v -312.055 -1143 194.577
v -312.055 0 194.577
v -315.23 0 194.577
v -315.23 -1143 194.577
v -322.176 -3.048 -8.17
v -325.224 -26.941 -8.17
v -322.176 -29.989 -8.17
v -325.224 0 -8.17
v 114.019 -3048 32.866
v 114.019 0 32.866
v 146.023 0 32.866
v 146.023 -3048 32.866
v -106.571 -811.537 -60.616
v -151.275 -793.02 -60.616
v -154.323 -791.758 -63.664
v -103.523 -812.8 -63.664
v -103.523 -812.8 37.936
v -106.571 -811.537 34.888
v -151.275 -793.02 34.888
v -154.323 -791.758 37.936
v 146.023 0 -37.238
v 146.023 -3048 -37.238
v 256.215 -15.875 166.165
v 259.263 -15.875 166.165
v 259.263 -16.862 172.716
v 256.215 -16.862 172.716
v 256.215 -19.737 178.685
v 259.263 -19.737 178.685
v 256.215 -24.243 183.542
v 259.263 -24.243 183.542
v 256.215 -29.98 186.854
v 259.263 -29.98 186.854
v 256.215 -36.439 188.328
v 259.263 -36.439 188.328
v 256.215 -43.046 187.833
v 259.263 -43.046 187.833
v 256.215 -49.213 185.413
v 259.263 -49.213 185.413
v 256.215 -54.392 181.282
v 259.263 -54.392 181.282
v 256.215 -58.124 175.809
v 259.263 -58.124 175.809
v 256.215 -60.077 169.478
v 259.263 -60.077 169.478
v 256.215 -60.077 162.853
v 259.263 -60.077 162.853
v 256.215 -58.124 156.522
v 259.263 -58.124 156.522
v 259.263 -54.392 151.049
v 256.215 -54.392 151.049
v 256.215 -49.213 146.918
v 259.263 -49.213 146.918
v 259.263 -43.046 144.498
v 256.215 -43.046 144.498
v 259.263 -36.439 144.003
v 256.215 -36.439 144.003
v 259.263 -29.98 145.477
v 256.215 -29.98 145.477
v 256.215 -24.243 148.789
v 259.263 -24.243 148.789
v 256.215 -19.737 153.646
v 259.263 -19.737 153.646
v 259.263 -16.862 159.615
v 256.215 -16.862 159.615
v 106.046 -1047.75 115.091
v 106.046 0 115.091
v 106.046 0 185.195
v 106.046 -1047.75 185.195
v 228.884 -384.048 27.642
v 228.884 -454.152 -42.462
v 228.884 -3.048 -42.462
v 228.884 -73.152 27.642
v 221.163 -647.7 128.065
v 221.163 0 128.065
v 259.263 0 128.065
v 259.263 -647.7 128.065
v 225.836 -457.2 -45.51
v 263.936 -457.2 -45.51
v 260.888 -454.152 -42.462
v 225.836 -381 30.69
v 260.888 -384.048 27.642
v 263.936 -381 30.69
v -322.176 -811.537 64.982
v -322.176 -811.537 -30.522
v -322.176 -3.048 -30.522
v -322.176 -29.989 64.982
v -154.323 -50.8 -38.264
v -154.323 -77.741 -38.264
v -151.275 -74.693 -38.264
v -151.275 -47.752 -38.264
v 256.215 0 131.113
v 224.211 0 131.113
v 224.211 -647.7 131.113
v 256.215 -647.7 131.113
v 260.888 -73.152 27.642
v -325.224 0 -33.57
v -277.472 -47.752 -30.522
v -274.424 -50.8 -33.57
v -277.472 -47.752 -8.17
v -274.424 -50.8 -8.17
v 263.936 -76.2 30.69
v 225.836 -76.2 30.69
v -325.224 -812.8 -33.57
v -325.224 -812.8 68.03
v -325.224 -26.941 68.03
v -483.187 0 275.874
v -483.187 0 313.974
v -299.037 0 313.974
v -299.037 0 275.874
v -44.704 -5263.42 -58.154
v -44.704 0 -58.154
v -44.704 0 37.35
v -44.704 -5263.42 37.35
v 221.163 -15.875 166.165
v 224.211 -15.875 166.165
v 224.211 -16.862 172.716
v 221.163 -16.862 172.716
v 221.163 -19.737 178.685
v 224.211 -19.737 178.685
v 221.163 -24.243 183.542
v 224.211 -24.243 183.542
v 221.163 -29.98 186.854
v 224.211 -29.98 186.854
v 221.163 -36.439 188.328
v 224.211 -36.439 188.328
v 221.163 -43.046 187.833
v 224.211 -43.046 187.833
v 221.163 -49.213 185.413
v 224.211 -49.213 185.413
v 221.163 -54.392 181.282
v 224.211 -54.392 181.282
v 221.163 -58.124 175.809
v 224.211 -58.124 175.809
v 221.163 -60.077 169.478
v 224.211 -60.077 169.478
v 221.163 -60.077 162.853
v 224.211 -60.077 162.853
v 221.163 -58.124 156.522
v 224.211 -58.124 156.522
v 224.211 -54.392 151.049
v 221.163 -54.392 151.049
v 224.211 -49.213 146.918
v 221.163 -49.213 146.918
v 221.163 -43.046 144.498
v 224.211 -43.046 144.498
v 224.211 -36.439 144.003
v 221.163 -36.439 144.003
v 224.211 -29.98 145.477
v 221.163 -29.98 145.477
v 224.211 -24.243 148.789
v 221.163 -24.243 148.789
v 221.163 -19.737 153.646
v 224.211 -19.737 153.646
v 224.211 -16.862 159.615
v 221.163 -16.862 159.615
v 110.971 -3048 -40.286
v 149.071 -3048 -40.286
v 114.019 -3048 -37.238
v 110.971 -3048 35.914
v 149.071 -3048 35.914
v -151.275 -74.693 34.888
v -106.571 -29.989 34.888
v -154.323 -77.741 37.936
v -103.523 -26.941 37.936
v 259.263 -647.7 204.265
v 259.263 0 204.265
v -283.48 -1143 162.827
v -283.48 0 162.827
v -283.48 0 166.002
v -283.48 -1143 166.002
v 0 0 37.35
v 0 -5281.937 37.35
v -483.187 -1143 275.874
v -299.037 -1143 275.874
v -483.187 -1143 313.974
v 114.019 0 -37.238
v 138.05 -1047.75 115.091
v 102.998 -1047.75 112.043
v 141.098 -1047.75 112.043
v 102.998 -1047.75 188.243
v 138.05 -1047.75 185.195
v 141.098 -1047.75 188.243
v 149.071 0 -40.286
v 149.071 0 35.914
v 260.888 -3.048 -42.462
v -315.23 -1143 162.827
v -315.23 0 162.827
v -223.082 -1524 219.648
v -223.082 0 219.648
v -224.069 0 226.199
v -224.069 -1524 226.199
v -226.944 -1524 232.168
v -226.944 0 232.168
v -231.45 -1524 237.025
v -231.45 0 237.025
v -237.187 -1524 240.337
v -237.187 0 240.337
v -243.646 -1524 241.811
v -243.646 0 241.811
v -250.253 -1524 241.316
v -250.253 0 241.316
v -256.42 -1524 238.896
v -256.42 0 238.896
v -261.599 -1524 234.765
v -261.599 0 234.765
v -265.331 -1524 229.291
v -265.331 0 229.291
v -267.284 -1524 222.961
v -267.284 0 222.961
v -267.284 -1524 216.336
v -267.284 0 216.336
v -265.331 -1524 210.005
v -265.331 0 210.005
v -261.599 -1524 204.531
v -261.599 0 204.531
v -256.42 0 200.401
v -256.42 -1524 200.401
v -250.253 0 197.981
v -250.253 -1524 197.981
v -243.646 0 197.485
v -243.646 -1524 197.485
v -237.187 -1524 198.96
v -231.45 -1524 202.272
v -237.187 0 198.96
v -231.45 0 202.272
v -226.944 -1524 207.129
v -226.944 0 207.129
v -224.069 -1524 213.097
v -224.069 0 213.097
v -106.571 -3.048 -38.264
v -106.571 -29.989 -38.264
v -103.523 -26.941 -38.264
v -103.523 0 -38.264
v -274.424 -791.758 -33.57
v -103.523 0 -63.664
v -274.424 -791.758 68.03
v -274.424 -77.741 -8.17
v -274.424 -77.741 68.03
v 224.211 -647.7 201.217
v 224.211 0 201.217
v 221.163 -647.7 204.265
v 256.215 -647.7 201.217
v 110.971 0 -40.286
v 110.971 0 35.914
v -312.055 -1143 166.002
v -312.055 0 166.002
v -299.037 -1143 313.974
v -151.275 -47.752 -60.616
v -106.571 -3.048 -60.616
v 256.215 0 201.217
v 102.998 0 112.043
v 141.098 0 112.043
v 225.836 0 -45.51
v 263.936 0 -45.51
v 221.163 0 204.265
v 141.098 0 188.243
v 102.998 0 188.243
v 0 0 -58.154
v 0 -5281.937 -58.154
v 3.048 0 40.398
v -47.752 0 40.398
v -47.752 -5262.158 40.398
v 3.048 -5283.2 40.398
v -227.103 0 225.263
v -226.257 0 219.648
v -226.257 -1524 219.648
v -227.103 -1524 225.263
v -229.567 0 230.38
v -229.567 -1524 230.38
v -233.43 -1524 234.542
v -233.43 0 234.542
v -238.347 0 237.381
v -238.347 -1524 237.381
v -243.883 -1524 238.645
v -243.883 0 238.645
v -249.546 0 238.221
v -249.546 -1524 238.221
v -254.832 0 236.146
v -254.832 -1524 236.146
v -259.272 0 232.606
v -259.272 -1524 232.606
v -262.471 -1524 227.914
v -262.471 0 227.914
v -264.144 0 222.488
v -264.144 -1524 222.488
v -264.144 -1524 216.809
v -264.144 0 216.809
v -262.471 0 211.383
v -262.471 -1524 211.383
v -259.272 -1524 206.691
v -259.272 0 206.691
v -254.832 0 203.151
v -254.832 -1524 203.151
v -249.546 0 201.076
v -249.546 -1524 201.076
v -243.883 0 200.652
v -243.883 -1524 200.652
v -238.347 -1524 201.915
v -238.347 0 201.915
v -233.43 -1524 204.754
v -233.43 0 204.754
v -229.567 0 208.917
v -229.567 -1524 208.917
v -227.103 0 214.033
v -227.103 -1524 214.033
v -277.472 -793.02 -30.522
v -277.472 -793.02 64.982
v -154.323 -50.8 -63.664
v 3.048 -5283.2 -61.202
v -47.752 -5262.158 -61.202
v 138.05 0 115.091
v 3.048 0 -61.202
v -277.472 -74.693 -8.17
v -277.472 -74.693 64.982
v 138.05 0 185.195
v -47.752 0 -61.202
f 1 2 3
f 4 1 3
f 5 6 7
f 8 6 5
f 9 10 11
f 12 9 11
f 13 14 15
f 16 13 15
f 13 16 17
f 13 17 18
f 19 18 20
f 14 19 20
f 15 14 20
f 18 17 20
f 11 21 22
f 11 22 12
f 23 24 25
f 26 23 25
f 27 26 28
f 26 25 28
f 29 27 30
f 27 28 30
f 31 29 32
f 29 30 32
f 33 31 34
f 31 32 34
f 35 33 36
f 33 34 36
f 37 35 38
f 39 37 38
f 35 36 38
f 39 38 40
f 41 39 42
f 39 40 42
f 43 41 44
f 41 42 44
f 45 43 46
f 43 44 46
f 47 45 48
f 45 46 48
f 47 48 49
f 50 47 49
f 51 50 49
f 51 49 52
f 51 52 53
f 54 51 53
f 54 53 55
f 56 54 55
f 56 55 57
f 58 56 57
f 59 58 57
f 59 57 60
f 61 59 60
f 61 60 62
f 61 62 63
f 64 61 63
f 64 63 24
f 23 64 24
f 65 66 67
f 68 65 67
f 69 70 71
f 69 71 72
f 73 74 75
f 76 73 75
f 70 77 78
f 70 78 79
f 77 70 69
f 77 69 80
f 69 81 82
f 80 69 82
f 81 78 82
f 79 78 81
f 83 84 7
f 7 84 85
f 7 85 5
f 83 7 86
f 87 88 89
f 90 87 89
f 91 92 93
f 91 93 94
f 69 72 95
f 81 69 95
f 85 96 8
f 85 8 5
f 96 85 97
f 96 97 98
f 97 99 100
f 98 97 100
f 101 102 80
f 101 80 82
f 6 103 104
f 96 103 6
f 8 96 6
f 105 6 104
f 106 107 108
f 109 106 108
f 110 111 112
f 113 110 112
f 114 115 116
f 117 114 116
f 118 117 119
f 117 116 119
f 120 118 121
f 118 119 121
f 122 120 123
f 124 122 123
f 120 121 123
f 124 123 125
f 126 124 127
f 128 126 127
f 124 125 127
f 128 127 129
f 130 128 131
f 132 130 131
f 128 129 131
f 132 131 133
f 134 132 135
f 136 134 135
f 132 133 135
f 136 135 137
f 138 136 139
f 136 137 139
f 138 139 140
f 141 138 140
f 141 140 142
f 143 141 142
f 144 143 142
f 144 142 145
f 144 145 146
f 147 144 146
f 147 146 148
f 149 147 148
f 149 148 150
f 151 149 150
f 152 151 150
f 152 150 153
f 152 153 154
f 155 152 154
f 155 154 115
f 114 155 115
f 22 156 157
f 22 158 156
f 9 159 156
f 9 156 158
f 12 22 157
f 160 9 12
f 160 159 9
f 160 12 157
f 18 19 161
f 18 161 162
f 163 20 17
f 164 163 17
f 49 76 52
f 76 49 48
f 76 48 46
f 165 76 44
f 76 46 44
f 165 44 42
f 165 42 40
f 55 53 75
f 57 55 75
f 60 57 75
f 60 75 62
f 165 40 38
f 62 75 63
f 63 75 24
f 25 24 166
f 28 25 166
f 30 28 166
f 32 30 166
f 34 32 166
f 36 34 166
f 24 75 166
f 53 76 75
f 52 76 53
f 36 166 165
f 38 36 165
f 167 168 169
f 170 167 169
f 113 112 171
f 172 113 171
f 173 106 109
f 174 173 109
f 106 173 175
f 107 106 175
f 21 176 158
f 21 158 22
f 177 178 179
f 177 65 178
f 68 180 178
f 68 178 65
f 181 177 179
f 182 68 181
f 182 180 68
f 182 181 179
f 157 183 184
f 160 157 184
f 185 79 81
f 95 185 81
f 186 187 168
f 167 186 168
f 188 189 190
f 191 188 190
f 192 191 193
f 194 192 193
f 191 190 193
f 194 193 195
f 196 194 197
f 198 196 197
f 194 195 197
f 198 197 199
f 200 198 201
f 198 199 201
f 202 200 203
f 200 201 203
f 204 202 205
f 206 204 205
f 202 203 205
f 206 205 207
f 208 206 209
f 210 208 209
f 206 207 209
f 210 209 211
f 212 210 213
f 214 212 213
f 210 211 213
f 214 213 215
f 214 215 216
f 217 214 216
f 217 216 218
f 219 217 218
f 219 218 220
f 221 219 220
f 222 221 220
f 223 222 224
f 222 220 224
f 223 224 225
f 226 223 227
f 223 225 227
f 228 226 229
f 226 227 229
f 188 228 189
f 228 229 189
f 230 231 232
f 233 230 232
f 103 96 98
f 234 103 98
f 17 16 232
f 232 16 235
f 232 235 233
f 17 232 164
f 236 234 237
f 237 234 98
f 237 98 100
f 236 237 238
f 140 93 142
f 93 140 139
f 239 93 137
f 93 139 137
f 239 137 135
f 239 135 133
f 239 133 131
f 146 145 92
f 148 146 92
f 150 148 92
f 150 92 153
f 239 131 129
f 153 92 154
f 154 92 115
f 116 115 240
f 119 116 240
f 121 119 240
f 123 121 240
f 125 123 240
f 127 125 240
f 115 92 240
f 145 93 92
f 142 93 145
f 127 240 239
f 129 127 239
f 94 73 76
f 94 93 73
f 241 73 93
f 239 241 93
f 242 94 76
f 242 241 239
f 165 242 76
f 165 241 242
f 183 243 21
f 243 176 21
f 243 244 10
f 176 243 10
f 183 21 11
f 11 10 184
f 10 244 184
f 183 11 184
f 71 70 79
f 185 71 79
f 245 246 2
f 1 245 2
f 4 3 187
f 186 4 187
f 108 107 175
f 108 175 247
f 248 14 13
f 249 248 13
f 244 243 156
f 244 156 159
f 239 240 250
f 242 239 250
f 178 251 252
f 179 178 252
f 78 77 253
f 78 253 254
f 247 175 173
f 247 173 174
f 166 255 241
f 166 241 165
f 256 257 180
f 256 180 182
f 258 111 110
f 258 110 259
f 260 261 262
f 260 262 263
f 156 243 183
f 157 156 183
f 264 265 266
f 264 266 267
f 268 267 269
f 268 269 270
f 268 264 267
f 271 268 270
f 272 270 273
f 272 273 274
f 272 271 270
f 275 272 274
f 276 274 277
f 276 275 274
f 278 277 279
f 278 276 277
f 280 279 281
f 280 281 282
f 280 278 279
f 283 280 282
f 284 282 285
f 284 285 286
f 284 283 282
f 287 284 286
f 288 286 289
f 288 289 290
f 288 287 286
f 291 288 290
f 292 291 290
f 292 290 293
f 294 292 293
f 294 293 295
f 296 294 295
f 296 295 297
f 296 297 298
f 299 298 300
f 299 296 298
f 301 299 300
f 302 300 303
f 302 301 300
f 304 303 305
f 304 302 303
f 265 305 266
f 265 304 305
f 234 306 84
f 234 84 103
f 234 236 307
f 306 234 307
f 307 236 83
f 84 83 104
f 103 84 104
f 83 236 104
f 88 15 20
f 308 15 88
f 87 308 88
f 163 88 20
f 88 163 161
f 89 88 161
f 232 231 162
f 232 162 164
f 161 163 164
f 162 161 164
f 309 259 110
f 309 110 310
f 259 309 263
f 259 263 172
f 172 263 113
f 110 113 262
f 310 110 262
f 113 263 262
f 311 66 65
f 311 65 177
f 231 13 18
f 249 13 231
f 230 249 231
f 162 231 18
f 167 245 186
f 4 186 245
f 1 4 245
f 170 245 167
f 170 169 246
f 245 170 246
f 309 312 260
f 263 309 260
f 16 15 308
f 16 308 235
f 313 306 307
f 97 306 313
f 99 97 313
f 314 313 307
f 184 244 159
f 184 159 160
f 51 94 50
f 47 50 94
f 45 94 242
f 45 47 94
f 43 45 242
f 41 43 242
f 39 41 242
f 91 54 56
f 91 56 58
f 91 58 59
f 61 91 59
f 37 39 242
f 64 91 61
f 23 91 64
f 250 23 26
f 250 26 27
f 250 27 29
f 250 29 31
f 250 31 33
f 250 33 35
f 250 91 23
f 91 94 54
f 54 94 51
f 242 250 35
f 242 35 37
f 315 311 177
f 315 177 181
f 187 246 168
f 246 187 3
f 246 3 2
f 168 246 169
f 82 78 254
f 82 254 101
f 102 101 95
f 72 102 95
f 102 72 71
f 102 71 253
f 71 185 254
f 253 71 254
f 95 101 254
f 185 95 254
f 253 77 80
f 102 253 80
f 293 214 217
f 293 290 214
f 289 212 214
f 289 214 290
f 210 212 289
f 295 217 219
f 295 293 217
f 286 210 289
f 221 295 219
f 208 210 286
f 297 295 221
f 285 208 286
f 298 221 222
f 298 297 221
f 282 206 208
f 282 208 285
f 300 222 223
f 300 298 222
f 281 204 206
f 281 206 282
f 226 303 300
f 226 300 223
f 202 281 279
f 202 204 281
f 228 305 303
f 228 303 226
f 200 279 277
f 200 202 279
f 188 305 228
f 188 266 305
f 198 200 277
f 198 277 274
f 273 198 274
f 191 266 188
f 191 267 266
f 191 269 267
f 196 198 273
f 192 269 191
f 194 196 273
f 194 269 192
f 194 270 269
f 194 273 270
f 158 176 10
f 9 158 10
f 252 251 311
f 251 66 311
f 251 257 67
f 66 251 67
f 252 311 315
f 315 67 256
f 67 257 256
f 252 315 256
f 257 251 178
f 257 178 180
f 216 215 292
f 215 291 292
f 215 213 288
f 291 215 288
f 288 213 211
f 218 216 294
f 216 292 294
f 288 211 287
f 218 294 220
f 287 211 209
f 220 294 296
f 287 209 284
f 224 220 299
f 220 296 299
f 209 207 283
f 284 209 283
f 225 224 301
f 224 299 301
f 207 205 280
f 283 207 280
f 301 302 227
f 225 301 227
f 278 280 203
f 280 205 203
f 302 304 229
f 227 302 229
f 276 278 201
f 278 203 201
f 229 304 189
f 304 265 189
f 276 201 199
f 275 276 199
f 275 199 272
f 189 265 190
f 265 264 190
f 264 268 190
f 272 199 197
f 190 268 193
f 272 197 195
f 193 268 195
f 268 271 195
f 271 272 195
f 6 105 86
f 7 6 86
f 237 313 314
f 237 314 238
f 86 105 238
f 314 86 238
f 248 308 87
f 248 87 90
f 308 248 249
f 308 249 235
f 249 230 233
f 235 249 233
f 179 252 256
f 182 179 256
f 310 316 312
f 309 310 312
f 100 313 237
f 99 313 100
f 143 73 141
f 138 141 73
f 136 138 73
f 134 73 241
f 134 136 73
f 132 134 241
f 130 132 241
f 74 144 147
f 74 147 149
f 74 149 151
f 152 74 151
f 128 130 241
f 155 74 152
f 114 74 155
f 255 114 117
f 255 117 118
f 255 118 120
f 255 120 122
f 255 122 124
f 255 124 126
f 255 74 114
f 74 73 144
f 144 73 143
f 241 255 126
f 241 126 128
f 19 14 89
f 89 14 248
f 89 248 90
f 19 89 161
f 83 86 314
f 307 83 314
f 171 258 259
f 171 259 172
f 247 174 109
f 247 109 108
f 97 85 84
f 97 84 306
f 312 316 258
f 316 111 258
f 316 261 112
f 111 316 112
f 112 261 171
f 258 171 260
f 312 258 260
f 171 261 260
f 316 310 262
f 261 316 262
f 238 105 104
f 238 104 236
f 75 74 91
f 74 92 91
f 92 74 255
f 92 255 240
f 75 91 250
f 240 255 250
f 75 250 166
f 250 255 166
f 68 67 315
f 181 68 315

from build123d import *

# Parameters (mm, degrees)
F0_W      = 184.15
F0_H      = 38.1
F1_DEPTH  = 1143
F0_R      = 22.225
F0_R_2    = 19.05
F2_DEPTH  = 1524
F3_DEPTH  = 1143
F0_W_2    = 50.8
F0_H_2    = 101.5999930616
F0_W_3    = 44.704
F0_H_3    = 95.5039930616
F4_DEPTH  = 812.8
F5_DEPTH  = 5283.2
F0_W_4    = 38.1
F0_H_4    = 76.2
F0_W_5    = 32.004
F0_H_5    = 70.104
F6_DEPTH  = 1047.75
F7_DEPTH  = 3048
F8_DEPTH  = 647.7
F9_DEPTH  = 457.2
F12_R     = 22.225
F13_DEPTH = 38.1
F15_DEPTH = 38.1
F16_DEPTH = 101.6
F17_DEPTH = 76.2
F18_DEPTH = 101.6
F19_DEPTH = 101.6
F20_DEPTH = 812.8
F22_DEPTH = 101.6
F23_DEPTH = 76.2


with BuildPart() as f1:
    # F0 (on Front) → F1 (new body)
    with BuildSketch(Plane.XZ):
        with Locations((-391.1115131855, 294.9241080761)):
            Rectangle(F0_W, F0_H)
    extrude(amount=F1_DEPTH)


with BuildPart() as f2:
    # F0 (on Front) → F2 (new body)
    with BuildSketch(Plane.XZ):
        with Locations((-245.3070729971, 219.6483165026)):
            Circle(F0_R)
        with Locations((-245.3070729971, 219.6483165026)):
            Circle(F0_R_2, mode=Mode.SUBTRACT)
    extrude(amount=F2_DEPTH)


with BuildPart() as f3:
    # F0 (on Front) → F3 (new body)
    with BuildSketch(Plane.XZ):
        Polygon((-312.0547735214, 194.5774768591), (-315.2297735214, 194.5774768591), (-315.2297735214, 162.8274768591), (-283.4797735214, 162.8274768591), (-283.4797735214, 166.0024768591), (-312.0547735214, 166.0024768591), align=None)
    extrude(amount=F3_DEPTH)


with BuildPart() as f4:
    # F0 (on Front) → F4 (new body)
    with BuildSketch(Plane.XZ):
        with Locations((-128.9231777191, -12.8643456846)):
            Rectangle(F0_W_2, F0_H_2)
        with Locations((-128.9231777191, -12.8643456846)):
            Rectangle(F0_W_3, F0_H_3, mode=Mode.SUBTRACT)
    extrude(amount=F4_DEPTH)

    # F10 (on face) → F16 (cut)
    with BuildSketch(Plane.XY.offset(37.9356508461)):
        Polygon((-154.3231777191, -50.8), (-103.5231777191, 0), (-154.3231777191, 0), align=None)
    extrude(amount=-F16_DEPTH, mode=Mode.SUBTRACT)

    # F10 (on face) → F17 (cut)
    with BuildSketch(Plane.XY.offset(37.9356508461)):
        Polygon((-154.3231777191, -77.7407683632), (-103.5231777191, -26.9407683632), (-103.5231777191, 0), (-154.3231777191, -50.8), align=None)
    extrude(amount=-F17_DEPTH, mode=Mode.SUBTRACT)

    # F10 (on face) → F18 (cut)
    with BuildSketch(Plane.XY.offset(37.9356508461)):
        Polygon((-154.3231777191, -812.8), (-103.5231777191, -812.8), (-154.3231777191, -791.7579510314), align=None)
    extrude(amount=-F18_DEPTH, mode=Mode.SUBTRACT)


with BuildPart() as f5:
    # F0 (on Front) → F5 (new body)
    with BuildSketch(Plane.XZ):
        with Locations((-22.352, -10.4024226334)):
            Rectangle(F0_W_2, F0_H_2)
        with Locations((-22.352, -10.4024226334)):
            Rectangle(F0_W_3, F0_H_3, mode=Mode.SUBTRACT)
    extrude(amount=F5_DEPTH)

    # F11 (on face) → F19 (cut)
    with BuildSketch(Plane.XY.offset(40.3975738974)):
        Polygon((-47.752, -5283.2), (3.048, -5283.2), (-47.752, -5262.1579510314), align=None)
    extrude(amount=-F19_DEPTH, mode=Mode.SUBTRACT)


with BuildPart() as f6:
    # F0 (on Front) → F6 (new body)
    with BuildSketch(Plane.XZ):
        with Locations((122.0478639007, 150.1430720091)):
            Rectangle(F0_W_4, F0_H_4)
        with Locations((122.0478639007, 150.1430720091)):
            Rectangle(F0_W_5, F0_H_5, mode=Mode.SUBTRACT)
    extrude(amount=F6_DEPTH)


with BuildPart() as f7:
    # F0 (on Front) → F7 (new body)
    with BuildSketch(Plane.XZ):
        with Locations((130.0213145256, -2.1859001739)):
            Rectangle(F0_W_4, F0_H_4)
        with Locations((130.0213145256, -2.1859001739)):
            Rectangle(F0_W_5, F0_H_5, mode=Mode.SUBTRACT)
    extrude(amount=F7_DEPTH)


with BuildPart() as f8:
    # F0 (on Front) → F8 (new body)
    with BuildSketch(Plane.XZ):
        with Locations((240.2129620314, 166.165471077)):
            Rectangle(F0_W_4, F0_H_4)
        with Locations((240.2129620314, 166.165471077)):
            Rectangle(F0_W_5, F0_H_5, mode=Mode.SUBTRACT)
    extrude(amount=F8_DEPTH)

    # F12 (on face) → F13 (cut)
    with BuildSketch(Plane.YZ.offset(259.2629620314)):
        with Locations((-38.1, 166.165471077)):
            Circle(F12_R)
    extrude(amount=-F13_DEPTH, mode=Mode.SUBTRACT)


with BuildPart() as f9:
    # F0 (on Front) → F9 (new body)
    with BuildSketch(Plane.XZ):
        with Locations((244.8861449957, -7.4103875086)):
            Rectangle(F0_W_4, F0_H_4)
        with Locations((244.8861449957, -7.4103875086)):
            Rectangle(F0_W_5, F0_H_5, mode=Mode.SUBTRACT)
    extrude(amount=F9_DEPTH)

    # F14 (on face) → F15 (cut)
    with BuildSketch(Plane.YZ.offset(263.9361449957)):
        Polygon((-457.2, 30.6896124914), (-457.2, -45.5103875086), (-381, 30.6896124914), align=None)
        Polygon((-76.2, 30.6896124914), (0, -45.5103875086), (0, 30.6896124914), align=None)
    extrude(amount=-F15_DEPTH, mode=Mode.SUBTRACT)


with BuildPart() as f20:
    # F0 (on Front) → F20 (new body)
    with BuildSketch(Plane.XZ):
        with Locations((-299.823731184, 17.2296445817)):
            Rectangle(F0_W_2, F0_H_2)
        with Locations((-299.823731184, 17.2296445817)):
            Rectangle(F0_W_3, F0_H_3, mode=Mode.SUBTRACT)
    extrude(amount=F20_DEPTH)

    # F21 (on face) → F22 (cut)
    with BuildSketch(Plane.XY.offset(68.0296411125)):
        Polygon((-274.423731184, -791.7579510314), (-325.223731184, -812.8), (-274.423731184, -812.8), align=None)
        Polygon((-274.423731184, 0), (-325.223731184, 0), (-274.423731184, -50.8), align=None)
    extrude(amount=-F22_DEPTH, mode=Mode.SUBTRACT)

    # F21 (on face) → F23 (cut)
    with BuildSketch(Plane.XY.offset(68.0296411125)):
        Polygon((-325.223731184, 0), (-325.223731184, -26.9407683632), (-274.423731184, -77.7407683632), (-274.423731184, -50.8), align=None)
    extrude(amount=-F23_DEPTH, mode=Mode.SUBTRACT)


solid = Compound([f1.part, f2.part, f3.part, f4.part, f5.part, f6.part, f7.part, f8.part, f9.part, f20.part])
